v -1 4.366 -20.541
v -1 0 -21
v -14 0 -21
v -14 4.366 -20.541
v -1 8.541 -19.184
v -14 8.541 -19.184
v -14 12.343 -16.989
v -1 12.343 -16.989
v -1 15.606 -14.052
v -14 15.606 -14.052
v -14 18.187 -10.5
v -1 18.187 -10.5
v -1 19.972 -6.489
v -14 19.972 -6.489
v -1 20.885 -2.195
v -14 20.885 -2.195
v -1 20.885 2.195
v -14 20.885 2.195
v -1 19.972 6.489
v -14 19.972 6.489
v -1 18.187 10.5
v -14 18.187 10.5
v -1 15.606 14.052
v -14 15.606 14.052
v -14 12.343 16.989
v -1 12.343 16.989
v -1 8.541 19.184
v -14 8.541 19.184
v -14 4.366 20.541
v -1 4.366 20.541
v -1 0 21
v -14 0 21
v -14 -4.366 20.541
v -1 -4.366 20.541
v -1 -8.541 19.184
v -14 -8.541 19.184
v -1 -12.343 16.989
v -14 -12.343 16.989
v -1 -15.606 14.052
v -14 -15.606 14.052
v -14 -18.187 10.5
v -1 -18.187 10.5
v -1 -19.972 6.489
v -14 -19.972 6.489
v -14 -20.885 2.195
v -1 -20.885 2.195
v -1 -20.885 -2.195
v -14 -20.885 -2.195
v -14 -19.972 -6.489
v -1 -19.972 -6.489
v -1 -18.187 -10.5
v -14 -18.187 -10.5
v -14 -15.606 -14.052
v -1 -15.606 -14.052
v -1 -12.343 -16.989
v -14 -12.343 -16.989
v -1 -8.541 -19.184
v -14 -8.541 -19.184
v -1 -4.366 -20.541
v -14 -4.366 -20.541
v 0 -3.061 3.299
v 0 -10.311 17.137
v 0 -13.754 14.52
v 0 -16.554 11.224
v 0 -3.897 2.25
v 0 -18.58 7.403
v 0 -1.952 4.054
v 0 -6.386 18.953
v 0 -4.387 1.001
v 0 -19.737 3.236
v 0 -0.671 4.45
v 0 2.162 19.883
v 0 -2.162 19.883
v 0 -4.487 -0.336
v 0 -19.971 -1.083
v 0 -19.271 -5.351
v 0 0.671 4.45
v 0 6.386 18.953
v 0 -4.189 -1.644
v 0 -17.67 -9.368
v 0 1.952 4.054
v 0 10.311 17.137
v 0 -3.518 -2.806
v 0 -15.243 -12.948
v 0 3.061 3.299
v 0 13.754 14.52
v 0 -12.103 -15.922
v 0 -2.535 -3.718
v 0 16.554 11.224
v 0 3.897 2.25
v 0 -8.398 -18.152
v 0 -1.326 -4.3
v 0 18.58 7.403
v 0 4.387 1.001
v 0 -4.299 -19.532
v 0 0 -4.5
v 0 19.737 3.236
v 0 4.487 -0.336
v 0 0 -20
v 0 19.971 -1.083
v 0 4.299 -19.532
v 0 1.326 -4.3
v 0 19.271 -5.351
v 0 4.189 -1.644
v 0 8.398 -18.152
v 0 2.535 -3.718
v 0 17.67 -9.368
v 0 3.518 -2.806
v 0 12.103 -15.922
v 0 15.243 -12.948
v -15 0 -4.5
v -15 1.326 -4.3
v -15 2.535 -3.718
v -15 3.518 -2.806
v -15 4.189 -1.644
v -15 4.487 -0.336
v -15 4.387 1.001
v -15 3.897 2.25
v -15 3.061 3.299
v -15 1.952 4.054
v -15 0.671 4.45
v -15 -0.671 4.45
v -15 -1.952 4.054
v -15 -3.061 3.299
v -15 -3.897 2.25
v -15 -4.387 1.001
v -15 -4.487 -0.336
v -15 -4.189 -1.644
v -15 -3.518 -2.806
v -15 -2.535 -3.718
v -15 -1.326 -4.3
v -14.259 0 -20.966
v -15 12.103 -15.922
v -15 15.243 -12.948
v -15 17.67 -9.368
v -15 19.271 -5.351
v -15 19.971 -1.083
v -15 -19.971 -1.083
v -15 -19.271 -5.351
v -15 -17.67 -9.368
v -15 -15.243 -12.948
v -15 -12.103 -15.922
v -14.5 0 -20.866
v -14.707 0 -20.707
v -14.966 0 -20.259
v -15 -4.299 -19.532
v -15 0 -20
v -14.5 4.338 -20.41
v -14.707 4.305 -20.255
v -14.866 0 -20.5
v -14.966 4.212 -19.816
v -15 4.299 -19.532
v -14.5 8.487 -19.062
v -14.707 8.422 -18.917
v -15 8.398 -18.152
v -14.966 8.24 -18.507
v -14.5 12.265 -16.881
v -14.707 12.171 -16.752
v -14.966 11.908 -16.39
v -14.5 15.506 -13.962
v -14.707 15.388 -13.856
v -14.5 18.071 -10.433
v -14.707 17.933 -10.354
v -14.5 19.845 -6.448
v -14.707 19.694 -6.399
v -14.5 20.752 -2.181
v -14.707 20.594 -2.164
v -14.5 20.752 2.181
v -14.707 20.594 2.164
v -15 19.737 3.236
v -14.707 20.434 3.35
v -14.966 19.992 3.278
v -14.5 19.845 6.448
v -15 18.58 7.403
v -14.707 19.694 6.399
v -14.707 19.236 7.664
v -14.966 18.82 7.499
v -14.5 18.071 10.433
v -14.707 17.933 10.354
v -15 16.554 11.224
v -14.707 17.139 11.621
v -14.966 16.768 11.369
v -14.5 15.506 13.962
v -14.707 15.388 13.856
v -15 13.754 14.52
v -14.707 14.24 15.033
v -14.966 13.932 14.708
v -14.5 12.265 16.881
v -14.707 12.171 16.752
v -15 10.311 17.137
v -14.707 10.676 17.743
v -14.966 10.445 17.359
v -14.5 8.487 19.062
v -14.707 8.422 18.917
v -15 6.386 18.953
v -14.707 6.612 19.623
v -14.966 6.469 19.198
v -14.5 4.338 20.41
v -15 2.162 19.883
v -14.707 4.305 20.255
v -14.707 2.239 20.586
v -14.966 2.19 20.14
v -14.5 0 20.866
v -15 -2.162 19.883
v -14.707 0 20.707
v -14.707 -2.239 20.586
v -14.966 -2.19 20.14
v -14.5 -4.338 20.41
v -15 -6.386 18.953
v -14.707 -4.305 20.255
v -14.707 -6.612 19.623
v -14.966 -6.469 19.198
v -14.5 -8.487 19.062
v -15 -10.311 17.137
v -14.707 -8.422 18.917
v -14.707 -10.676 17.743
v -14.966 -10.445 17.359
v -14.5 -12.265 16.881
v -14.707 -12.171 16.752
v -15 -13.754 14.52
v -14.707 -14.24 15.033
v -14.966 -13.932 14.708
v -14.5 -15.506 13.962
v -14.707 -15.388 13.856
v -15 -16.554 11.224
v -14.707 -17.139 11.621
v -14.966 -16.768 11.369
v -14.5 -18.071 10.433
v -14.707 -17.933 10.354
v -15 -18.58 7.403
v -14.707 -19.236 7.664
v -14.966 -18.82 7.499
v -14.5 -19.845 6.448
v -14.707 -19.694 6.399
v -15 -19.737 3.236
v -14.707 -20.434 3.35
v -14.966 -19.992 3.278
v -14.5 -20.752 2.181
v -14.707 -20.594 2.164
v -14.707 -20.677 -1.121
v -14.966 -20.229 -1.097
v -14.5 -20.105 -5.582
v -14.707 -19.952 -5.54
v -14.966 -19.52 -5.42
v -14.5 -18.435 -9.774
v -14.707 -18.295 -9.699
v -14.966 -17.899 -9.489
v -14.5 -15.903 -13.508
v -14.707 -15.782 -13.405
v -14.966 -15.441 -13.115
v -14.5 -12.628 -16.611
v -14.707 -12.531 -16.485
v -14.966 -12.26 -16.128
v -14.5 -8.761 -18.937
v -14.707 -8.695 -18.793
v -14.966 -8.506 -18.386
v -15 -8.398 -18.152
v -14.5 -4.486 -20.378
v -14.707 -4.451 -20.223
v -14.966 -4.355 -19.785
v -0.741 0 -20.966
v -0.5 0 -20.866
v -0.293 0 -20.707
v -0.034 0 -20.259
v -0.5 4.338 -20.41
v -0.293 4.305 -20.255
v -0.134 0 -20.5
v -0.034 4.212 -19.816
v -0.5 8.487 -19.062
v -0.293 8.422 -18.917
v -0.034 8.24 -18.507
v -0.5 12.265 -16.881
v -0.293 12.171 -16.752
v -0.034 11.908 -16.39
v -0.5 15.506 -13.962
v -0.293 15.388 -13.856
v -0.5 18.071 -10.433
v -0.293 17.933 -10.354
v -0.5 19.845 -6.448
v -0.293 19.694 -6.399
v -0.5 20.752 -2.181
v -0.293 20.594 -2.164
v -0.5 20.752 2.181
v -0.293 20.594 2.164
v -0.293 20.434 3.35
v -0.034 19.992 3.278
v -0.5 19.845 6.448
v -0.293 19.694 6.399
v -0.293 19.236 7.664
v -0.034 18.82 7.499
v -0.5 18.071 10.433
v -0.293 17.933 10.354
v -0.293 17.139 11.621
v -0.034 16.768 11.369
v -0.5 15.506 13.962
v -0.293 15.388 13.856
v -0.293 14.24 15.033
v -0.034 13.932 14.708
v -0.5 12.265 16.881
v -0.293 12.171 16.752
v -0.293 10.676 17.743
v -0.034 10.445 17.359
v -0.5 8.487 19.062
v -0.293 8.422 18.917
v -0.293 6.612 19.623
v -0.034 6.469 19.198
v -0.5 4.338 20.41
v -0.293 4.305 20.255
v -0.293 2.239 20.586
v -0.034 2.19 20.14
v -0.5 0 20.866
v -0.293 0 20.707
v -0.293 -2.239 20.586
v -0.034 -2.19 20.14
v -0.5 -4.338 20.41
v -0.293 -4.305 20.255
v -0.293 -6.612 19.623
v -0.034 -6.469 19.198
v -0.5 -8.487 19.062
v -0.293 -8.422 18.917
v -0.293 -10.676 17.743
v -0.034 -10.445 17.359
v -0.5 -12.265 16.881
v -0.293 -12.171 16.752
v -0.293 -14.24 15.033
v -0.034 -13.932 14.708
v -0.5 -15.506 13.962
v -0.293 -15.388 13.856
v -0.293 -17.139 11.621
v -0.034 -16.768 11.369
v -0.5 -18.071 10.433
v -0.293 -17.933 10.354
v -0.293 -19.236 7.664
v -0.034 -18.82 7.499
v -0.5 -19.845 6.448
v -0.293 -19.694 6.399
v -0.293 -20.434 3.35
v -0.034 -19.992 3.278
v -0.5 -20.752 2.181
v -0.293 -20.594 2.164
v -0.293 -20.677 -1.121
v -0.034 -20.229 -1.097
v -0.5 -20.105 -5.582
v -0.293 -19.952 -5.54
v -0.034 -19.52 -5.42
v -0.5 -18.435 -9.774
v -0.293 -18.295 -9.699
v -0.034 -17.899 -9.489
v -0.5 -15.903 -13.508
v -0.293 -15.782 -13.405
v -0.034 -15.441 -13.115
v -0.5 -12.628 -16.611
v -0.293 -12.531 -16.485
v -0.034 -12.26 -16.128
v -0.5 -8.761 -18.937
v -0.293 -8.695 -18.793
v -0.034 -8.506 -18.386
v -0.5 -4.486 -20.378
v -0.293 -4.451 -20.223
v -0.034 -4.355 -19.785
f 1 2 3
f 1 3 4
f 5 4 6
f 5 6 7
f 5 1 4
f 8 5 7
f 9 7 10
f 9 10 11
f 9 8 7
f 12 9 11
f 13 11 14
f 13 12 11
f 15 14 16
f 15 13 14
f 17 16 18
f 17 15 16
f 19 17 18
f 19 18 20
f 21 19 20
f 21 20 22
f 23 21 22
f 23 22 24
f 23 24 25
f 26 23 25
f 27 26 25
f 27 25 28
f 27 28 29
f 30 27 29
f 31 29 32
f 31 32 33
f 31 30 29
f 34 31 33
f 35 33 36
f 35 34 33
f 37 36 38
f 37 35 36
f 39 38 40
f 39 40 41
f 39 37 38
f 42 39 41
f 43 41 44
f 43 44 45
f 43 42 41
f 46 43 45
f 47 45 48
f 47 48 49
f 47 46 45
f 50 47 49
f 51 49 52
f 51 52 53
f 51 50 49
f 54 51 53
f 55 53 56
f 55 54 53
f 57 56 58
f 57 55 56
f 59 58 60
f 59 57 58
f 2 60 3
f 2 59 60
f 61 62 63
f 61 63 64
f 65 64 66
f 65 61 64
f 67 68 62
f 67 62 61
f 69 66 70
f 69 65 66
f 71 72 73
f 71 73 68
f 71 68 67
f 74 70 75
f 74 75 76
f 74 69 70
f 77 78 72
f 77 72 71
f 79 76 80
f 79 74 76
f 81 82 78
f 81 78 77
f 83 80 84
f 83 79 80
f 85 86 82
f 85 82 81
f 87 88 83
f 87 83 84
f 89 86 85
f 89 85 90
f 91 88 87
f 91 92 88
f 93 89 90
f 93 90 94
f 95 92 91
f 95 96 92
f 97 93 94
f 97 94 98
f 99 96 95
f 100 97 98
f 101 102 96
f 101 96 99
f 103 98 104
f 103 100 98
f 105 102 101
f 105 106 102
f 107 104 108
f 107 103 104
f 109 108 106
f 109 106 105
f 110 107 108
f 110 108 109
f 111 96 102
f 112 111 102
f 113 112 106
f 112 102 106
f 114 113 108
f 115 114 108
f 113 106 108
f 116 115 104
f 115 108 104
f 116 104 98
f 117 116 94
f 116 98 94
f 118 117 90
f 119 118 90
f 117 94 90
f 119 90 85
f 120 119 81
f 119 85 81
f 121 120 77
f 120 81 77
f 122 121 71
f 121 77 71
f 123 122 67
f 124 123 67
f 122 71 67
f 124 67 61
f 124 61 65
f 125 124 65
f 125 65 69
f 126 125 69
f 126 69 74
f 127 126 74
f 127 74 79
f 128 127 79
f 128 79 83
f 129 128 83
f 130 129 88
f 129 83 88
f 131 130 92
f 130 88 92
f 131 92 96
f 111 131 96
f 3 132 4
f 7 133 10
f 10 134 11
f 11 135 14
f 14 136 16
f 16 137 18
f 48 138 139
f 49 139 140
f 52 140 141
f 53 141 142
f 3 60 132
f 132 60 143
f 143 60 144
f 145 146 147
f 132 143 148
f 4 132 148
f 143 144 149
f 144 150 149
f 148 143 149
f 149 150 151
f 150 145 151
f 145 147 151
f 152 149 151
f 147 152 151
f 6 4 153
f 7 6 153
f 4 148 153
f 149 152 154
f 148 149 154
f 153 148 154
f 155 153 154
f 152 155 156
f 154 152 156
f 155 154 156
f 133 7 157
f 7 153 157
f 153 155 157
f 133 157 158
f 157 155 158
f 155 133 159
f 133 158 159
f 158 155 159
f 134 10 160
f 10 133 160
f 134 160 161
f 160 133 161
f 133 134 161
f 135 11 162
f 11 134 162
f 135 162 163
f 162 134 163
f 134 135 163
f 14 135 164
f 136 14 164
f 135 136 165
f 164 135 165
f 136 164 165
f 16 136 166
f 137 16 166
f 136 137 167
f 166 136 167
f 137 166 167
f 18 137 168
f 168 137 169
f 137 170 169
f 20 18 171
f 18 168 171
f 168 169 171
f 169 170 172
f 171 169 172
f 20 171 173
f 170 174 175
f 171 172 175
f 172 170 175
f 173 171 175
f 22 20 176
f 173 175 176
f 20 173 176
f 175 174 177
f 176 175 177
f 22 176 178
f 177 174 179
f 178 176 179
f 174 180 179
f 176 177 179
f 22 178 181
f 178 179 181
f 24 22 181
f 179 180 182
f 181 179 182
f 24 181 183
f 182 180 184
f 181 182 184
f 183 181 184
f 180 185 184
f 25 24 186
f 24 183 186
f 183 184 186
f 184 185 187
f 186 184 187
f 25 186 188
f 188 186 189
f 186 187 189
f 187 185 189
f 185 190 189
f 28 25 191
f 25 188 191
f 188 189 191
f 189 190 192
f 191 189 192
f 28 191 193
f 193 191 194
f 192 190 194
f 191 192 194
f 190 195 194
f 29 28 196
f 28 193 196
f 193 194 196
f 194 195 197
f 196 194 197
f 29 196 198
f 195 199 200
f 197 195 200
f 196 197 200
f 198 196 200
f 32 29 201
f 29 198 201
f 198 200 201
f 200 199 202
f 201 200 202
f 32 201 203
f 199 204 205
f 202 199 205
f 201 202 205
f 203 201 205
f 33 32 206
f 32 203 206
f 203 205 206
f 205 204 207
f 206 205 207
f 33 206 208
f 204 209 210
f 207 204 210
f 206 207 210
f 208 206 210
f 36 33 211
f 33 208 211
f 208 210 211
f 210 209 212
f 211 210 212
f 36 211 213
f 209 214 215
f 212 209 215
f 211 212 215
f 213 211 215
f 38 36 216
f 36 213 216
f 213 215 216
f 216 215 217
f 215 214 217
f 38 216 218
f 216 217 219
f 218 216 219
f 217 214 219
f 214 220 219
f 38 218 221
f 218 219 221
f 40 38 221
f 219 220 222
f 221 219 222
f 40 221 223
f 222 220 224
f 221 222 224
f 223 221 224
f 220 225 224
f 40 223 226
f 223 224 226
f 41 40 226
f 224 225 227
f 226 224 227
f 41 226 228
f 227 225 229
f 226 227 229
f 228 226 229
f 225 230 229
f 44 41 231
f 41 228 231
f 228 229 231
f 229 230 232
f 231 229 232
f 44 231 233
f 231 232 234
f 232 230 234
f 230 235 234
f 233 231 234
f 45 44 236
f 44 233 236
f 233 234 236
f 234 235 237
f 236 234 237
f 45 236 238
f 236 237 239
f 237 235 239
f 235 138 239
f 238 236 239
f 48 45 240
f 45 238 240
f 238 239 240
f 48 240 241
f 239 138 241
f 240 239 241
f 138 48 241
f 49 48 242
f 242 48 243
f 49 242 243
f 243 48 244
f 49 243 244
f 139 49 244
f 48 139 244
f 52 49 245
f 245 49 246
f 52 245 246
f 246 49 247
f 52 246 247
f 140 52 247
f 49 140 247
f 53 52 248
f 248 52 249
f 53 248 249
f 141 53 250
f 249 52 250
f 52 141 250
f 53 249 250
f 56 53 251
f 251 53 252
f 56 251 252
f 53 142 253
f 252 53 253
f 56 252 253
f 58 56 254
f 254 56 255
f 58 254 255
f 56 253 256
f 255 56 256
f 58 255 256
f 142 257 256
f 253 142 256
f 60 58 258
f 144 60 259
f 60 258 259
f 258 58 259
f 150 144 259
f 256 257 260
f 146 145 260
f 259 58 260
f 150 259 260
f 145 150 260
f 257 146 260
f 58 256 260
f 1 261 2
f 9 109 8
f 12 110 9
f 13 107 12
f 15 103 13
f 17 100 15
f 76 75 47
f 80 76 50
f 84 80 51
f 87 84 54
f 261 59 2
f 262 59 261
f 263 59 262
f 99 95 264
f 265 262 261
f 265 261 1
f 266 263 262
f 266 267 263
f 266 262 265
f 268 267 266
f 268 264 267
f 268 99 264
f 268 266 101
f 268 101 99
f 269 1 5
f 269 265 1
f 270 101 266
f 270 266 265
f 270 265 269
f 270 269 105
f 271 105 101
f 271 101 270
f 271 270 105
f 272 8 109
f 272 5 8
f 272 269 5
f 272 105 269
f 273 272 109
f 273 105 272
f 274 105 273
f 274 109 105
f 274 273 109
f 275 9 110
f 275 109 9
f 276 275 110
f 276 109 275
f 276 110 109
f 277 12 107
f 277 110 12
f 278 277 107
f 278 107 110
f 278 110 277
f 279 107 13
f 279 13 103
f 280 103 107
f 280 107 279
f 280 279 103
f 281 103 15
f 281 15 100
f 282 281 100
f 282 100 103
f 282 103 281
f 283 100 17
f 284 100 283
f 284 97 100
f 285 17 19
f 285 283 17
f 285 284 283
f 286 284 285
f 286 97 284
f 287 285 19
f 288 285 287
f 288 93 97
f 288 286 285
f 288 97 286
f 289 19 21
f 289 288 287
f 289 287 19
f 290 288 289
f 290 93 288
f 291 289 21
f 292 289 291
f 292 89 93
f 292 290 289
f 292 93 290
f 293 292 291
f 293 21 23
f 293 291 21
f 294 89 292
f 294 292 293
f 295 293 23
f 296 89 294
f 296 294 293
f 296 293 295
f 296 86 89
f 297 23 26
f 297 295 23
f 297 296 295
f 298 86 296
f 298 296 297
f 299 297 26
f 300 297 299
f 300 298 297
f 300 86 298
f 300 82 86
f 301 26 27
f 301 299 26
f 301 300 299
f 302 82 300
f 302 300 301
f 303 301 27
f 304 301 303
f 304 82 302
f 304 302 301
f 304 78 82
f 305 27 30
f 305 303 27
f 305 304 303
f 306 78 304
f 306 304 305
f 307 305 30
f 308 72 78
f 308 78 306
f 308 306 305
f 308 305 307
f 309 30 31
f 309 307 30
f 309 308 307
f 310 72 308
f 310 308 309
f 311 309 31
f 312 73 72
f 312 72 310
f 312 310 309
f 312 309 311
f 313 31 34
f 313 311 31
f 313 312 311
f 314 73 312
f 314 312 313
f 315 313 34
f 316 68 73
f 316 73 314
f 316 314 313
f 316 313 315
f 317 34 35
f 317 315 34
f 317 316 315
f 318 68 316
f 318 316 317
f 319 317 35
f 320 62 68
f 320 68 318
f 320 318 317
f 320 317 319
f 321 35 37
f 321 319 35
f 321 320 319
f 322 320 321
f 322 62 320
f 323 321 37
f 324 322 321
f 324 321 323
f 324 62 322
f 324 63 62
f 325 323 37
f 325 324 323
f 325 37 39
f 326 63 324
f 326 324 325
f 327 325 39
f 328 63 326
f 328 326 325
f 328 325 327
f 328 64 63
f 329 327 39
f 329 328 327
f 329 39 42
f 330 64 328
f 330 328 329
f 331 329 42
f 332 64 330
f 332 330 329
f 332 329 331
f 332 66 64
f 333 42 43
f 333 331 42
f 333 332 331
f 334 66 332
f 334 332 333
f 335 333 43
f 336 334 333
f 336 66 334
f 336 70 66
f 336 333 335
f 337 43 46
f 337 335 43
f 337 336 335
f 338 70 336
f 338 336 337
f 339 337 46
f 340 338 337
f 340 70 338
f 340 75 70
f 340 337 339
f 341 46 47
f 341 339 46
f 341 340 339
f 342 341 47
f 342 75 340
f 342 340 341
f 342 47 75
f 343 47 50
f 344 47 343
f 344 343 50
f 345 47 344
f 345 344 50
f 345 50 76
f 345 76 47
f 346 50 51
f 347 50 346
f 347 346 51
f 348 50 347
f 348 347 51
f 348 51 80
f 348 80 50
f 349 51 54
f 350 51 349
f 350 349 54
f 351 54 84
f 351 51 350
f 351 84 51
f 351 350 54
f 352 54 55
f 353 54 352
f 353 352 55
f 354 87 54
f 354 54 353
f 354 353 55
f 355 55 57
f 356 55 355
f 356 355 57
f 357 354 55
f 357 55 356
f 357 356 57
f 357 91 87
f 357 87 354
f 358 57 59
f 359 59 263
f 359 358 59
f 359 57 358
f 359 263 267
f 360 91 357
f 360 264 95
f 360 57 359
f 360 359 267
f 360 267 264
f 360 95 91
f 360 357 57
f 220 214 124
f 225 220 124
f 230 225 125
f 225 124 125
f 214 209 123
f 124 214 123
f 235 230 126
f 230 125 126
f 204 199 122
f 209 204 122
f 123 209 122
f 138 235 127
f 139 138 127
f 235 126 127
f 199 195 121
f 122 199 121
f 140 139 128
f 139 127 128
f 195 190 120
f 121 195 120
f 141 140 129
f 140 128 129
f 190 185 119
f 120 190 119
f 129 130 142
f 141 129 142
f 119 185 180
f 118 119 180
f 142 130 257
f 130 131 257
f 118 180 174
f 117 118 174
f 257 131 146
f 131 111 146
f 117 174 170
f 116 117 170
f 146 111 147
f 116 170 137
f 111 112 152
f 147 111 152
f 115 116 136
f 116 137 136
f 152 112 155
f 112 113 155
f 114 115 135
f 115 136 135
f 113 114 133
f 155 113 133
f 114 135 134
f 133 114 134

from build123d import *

# Parameters (mm, degrees)
SKETCH1_R           = 21
BOSS_EXTRUDE1_DEPTH = 15
FILLET1_R           = 1
SKETCH2_R           = 4.5
CUT_EXTRUDE1_DEPTH  = 15


with BuildPart() as part:
    # Sketch1 → Boss-Extrude1 (new body)
    with BuildSketch(Plane(origin=(0, 0, 0), x_dir=(0, 0, -1), z_dir=(1, 0, 0))):
        Circle(SKETCH1_R)
    extrude(amount=-BOSS_EXTRUDE1_DEPTH)

    # Fillet1
    fillet1_edges = [part.edges().sort_by_distance(p)[0] for p in [
        (0, 0, 21),
        (-15, 0, 21),
    ]]
    fillet(fillet1_edges, radius=FILLET1_R)

    # Sketch2 → Cut-Extrude1 (cut)
    with BuildSketch(Plane(origin=(0, 0, 0), x_dir=(0, 0, -1), z_dir=(1, 0, 0))):
        Circle(SKETCH2_R)
    extrude(amount=-CUT_EXTRUDE1_DEPTH, mode=Mode.SUBTRACT)


solid = part.part
